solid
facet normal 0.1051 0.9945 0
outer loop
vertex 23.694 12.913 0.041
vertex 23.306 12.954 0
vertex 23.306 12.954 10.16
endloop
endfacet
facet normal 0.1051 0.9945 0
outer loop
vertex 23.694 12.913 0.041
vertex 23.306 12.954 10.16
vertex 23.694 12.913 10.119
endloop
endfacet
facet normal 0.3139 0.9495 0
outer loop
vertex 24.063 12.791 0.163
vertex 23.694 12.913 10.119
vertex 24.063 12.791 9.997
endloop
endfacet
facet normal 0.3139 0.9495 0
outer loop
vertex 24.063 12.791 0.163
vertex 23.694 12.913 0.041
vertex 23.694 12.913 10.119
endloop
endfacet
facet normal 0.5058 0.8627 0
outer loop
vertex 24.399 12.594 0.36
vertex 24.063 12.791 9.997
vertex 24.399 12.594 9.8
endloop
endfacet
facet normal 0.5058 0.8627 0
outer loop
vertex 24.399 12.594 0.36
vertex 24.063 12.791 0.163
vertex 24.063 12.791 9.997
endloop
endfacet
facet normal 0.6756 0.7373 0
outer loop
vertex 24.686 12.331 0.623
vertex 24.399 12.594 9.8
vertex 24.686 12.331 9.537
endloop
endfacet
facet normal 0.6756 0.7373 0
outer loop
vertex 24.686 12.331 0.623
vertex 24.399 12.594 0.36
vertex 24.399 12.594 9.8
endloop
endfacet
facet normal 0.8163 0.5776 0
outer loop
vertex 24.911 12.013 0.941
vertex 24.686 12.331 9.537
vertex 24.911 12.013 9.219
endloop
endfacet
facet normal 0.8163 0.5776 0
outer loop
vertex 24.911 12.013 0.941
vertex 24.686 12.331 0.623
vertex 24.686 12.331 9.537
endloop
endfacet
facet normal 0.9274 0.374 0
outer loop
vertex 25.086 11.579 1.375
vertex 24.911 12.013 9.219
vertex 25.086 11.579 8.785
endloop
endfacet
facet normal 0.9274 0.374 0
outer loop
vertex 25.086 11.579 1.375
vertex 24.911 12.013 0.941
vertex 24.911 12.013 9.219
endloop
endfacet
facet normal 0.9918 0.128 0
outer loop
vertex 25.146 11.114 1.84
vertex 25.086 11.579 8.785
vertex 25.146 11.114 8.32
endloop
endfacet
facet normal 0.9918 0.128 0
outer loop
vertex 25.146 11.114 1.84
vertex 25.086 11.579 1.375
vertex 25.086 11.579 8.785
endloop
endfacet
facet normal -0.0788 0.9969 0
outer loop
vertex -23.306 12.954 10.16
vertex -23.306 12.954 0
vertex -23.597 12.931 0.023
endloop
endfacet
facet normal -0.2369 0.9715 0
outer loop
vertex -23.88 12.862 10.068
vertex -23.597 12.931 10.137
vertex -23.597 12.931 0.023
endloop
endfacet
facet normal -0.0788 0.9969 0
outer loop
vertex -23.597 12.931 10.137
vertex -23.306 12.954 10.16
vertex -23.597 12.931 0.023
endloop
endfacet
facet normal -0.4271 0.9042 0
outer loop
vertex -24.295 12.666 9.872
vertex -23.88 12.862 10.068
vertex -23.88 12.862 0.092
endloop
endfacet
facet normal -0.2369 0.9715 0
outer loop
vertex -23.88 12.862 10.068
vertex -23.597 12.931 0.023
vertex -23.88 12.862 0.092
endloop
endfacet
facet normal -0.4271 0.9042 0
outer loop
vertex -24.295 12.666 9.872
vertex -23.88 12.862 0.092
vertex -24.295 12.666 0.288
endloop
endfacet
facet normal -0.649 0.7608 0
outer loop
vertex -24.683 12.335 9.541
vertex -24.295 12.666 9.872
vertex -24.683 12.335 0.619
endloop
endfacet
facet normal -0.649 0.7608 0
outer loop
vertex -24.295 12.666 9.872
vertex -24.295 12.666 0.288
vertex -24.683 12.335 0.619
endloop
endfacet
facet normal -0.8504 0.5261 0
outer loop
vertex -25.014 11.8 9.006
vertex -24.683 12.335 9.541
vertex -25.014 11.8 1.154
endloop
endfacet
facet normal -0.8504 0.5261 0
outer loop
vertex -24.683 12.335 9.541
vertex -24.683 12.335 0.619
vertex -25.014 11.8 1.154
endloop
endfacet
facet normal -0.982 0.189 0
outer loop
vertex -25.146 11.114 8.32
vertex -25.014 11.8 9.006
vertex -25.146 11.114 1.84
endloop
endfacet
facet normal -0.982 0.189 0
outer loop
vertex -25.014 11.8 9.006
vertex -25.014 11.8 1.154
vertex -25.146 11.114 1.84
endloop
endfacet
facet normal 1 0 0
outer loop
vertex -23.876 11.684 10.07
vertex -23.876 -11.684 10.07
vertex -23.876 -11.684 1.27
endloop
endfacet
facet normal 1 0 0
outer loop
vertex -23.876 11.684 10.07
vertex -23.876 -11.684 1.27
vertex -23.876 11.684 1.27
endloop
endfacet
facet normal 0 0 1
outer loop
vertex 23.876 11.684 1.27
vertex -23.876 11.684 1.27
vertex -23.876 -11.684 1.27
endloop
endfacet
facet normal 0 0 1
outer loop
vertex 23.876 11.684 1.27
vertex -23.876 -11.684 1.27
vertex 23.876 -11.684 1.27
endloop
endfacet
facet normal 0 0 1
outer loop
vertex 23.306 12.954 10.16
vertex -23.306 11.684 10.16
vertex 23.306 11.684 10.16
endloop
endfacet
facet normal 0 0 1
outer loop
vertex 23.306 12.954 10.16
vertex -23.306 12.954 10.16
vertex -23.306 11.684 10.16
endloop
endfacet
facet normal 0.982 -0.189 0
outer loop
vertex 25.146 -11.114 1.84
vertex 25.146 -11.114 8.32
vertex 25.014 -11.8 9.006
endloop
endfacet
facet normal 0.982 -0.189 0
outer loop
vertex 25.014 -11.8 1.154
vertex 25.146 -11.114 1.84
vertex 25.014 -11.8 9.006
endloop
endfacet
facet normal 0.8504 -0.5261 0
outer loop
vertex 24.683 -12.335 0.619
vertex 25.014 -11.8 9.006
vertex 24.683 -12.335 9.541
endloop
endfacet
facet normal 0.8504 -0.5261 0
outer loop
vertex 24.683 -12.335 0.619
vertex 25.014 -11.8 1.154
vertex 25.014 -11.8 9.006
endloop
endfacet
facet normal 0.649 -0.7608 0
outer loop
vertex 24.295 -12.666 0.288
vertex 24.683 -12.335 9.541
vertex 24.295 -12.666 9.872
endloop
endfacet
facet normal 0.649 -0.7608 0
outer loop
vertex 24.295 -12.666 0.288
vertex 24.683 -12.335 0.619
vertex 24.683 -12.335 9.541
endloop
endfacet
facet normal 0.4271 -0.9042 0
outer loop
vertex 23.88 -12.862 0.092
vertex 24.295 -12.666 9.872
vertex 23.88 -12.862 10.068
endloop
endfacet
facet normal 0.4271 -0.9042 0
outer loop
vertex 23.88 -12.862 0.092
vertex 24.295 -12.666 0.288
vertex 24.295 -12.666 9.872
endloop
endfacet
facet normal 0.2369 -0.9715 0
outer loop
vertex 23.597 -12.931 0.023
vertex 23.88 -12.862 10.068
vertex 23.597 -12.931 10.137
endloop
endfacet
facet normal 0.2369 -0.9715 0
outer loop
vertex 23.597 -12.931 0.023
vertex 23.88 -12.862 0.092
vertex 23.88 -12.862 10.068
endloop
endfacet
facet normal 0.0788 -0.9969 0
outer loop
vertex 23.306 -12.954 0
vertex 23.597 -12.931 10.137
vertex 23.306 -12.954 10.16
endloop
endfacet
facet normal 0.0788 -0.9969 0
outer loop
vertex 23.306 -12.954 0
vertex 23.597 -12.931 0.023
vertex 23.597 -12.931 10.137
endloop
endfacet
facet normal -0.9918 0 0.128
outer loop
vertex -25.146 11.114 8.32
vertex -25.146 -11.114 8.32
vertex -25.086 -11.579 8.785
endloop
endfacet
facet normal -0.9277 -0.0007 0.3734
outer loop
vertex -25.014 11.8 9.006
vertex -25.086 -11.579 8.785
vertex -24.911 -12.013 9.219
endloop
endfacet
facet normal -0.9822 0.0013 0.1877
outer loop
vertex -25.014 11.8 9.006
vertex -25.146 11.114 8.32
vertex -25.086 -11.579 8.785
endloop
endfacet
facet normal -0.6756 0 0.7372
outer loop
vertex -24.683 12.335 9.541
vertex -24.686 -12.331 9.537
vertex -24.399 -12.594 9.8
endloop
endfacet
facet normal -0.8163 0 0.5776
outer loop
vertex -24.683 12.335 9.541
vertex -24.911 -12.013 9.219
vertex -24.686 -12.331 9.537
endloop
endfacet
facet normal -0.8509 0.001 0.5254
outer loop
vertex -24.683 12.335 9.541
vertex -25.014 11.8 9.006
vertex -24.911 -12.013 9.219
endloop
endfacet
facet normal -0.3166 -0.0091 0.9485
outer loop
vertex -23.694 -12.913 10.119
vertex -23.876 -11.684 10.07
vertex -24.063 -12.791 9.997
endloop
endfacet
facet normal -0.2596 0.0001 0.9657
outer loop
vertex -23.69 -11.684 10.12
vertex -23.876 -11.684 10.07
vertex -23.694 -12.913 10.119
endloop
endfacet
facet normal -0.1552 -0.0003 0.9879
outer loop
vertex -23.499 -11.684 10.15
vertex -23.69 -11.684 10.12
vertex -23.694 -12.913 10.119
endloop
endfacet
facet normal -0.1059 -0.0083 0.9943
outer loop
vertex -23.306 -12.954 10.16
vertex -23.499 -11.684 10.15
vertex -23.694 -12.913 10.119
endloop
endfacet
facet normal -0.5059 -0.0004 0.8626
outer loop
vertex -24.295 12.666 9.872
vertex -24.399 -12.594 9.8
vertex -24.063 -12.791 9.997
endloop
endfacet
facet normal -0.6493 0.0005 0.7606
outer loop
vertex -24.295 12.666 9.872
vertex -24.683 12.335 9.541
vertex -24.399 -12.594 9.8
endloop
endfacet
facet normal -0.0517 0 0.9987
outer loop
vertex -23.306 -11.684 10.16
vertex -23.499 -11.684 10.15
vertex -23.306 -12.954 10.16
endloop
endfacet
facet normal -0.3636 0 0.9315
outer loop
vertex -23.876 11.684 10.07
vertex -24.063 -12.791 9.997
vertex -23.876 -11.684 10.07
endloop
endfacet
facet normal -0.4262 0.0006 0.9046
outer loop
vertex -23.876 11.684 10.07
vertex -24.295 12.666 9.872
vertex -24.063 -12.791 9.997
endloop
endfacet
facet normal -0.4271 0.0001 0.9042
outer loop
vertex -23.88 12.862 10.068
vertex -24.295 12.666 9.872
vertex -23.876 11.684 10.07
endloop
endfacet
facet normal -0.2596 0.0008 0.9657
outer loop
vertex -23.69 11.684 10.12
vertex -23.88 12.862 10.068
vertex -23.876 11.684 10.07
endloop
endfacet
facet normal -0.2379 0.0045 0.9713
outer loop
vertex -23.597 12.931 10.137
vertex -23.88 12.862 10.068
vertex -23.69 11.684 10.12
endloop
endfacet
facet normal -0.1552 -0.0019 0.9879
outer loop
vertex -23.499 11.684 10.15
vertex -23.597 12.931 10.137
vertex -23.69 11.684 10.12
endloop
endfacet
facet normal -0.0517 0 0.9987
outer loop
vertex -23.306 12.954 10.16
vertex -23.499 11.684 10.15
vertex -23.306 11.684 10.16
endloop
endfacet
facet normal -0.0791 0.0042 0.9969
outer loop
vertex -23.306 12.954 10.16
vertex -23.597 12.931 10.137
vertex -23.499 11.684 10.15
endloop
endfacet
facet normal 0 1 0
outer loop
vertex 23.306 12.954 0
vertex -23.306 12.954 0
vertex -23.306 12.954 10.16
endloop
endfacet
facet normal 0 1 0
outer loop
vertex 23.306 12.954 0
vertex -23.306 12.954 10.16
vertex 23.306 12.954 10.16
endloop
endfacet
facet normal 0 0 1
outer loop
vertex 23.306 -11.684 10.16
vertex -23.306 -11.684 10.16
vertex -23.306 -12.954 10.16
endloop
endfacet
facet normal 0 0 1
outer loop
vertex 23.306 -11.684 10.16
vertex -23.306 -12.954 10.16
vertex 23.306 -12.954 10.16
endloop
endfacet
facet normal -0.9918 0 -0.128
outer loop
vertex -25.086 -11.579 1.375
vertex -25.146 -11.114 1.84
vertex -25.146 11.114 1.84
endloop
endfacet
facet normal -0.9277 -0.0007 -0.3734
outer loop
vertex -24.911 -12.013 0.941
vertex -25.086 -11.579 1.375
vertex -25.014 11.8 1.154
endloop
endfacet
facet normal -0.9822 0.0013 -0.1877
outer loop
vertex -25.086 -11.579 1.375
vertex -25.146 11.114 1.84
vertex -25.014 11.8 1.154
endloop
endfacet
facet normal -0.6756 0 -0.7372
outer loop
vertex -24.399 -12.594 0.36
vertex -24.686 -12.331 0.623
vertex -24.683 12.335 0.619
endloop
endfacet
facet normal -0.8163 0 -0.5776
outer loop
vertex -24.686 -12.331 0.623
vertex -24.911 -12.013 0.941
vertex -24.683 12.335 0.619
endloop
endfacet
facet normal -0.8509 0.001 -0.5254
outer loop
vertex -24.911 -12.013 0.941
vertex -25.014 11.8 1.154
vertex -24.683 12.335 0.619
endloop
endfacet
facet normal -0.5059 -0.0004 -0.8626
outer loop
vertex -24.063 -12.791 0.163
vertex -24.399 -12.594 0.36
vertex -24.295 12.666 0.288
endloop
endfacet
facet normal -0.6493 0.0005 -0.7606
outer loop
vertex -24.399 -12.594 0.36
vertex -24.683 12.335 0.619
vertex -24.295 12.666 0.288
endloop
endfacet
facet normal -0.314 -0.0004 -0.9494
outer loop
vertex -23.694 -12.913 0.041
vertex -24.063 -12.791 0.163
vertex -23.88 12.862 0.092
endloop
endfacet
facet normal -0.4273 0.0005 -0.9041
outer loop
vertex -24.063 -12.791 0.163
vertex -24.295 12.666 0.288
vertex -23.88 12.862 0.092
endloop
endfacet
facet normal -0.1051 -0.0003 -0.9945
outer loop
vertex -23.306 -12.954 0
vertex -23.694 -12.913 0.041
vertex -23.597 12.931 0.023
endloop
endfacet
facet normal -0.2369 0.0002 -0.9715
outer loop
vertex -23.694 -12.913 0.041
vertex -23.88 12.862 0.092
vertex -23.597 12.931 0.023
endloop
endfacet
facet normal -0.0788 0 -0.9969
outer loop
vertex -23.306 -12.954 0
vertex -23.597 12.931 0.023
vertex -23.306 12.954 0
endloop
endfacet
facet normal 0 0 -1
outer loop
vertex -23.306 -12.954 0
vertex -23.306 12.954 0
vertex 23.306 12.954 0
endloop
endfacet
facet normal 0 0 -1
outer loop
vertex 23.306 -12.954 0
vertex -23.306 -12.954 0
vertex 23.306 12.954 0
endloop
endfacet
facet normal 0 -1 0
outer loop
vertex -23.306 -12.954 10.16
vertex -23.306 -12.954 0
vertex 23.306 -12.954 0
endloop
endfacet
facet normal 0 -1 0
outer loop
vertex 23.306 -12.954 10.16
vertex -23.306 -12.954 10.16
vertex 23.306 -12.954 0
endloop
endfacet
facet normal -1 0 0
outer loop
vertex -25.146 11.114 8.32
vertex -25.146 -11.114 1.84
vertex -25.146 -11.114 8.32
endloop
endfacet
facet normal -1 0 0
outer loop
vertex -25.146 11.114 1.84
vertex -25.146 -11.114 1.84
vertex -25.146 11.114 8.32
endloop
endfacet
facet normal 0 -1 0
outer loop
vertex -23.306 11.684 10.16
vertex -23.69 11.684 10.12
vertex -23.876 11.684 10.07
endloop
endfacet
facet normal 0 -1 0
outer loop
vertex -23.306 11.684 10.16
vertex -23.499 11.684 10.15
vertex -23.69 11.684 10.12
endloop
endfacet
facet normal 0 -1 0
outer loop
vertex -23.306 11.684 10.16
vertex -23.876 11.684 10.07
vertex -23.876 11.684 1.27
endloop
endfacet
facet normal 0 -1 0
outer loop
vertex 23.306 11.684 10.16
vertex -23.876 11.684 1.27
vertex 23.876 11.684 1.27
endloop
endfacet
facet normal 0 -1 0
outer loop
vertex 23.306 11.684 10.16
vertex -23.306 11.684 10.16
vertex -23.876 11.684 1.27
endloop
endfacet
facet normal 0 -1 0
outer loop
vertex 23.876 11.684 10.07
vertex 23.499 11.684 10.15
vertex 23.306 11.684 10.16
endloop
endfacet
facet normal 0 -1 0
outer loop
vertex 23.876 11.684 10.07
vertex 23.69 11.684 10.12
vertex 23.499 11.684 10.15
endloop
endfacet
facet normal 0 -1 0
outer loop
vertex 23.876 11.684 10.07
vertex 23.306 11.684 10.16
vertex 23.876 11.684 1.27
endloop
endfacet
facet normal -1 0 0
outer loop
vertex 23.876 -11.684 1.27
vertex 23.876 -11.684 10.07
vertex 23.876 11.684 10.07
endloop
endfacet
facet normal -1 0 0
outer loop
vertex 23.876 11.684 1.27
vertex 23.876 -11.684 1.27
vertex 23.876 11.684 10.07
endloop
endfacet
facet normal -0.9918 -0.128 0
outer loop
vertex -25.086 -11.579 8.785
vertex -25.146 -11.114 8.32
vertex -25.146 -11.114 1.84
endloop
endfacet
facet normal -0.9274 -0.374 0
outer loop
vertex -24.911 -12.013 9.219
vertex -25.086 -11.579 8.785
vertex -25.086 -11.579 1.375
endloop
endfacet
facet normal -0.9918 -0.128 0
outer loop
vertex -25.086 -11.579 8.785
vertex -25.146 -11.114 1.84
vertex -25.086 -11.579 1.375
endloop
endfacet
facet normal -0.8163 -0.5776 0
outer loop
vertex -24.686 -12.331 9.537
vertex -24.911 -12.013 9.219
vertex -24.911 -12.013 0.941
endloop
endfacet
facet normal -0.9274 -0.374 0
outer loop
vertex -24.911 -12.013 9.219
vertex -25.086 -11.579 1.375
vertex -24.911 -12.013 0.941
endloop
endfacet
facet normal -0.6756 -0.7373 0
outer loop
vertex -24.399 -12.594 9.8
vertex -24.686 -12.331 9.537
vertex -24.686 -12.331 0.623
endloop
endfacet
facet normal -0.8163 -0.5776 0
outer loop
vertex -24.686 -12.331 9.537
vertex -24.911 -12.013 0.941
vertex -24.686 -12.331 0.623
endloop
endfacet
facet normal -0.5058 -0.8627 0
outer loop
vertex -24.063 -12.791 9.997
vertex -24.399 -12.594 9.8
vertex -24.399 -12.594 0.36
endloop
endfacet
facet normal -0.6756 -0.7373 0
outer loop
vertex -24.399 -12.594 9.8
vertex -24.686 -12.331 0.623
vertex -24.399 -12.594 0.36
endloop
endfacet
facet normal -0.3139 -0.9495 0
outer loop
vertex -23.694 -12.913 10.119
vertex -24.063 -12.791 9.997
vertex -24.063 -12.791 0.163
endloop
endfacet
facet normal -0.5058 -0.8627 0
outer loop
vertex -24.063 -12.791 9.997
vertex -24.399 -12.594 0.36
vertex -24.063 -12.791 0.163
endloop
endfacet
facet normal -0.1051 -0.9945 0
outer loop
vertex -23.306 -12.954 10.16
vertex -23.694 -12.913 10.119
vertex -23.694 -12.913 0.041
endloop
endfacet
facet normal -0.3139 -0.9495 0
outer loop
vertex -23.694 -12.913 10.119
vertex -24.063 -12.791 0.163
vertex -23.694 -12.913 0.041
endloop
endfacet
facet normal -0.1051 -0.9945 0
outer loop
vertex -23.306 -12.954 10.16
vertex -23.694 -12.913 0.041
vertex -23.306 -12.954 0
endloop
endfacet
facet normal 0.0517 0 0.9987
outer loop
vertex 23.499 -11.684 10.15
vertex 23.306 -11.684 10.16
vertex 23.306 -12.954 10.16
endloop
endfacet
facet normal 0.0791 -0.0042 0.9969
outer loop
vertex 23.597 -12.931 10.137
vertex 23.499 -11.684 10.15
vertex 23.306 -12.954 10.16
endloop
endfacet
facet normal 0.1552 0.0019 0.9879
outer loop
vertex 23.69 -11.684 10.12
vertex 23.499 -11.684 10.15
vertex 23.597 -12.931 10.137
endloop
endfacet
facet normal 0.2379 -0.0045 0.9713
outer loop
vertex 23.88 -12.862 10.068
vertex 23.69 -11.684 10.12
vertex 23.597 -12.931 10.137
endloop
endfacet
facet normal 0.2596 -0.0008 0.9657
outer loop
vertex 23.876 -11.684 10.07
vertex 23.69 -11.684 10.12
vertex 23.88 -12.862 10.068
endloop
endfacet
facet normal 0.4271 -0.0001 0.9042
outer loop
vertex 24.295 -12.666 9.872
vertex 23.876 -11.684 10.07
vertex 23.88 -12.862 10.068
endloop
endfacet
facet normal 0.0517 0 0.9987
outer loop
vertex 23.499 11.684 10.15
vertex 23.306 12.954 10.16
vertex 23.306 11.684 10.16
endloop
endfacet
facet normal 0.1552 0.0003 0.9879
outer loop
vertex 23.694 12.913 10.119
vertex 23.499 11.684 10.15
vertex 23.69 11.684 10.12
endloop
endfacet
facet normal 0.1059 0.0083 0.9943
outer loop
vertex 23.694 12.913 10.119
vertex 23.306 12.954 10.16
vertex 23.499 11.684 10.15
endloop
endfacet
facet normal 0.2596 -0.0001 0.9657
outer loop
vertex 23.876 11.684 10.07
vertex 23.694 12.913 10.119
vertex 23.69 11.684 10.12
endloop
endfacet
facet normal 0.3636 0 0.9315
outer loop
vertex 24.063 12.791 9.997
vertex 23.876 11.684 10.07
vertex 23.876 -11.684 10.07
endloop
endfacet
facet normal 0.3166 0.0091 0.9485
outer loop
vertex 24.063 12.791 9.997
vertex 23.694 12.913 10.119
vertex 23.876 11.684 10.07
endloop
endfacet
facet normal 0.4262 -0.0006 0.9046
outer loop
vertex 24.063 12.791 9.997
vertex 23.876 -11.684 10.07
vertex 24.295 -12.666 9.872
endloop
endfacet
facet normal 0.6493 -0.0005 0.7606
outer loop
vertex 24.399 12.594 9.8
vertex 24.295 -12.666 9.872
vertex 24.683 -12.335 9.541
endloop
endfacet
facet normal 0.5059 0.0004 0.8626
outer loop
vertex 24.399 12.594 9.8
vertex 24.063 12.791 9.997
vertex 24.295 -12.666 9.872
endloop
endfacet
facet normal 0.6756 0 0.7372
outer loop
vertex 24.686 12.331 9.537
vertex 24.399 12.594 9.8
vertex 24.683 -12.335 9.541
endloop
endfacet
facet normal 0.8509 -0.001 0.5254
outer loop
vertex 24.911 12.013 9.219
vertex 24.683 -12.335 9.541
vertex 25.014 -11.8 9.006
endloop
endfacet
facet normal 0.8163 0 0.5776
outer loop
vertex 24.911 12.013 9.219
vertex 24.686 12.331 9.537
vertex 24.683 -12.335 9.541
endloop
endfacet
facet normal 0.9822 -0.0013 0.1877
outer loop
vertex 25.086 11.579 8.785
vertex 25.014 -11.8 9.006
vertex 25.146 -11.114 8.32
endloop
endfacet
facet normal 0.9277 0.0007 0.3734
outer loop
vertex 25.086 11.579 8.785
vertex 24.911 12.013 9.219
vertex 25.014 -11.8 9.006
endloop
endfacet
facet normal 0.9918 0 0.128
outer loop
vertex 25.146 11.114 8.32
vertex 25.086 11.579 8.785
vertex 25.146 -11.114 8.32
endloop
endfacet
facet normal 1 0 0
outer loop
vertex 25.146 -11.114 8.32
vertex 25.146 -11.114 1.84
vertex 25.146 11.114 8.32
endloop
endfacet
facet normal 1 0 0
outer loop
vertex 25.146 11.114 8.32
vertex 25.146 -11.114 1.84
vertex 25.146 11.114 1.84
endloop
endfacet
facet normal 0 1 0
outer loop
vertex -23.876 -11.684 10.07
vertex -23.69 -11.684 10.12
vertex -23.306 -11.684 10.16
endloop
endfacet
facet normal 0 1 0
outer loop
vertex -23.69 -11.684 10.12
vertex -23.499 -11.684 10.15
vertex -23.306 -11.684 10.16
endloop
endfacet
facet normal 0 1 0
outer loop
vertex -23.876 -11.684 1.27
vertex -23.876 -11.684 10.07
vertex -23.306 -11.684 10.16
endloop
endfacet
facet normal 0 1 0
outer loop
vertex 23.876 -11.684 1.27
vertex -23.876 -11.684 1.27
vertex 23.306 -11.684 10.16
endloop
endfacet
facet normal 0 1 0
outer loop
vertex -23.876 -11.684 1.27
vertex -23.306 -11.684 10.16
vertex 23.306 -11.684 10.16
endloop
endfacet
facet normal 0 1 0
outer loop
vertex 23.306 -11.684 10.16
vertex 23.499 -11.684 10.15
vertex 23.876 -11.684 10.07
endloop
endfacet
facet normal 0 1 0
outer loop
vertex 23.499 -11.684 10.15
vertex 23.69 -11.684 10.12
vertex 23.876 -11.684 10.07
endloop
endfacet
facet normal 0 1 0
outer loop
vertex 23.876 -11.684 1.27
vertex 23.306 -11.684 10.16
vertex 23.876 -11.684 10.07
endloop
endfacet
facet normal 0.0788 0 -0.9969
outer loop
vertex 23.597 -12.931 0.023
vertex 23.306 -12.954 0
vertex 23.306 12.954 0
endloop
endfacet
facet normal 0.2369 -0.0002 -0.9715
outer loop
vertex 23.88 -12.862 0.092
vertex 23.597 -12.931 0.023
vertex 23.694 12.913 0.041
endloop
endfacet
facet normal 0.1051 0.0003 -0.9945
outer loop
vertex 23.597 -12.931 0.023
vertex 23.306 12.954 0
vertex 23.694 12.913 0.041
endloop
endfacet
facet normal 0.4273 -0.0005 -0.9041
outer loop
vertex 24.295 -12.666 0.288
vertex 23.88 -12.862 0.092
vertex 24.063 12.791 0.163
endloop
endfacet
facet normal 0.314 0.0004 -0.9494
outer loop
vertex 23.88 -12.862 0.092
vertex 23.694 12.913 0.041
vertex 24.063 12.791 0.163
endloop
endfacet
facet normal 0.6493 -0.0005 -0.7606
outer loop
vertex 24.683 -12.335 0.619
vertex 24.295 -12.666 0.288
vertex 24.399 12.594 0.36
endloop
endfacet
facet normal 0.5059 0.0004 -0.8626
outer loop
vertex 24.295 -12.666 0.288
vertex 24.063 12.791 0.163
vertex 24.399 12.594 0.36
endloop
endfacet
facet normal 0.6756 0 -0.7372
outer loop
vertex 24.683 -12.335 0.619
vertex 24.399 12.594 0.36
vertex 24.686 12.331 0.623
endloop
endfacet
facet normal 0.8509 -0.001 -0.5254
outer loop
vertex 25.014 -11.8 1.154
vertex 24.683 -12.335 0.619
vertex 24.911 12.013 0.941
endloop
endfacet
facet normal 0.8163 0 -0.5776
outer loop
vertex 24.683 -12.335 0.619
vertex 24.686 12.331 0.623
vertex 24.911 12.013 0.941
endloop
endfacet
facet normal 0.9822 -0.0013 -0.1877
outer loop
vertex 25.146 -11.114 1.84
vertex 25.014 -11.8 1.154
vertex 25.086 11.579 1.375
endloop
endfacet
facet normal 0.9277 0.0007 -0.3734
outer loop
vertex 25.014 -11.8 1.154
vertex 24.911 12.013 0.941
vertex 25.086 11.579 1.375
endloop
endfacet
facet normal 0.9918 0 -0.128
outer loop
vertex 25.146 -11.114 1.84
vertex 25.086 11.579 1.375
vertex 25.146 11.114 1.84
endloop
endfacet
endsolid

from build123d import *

# Parameters (mm, degrees)
F0_W        = 50.292
F0_H        = 25.908
F1_DEPTH    = 10.16
F2_W        = 47.752
F2_H        = 23.368
F3_DEPTH    = 8.89
F4_T1_DEPTH = 19.3581536726
F4_T3_DEPTH = 35.1061536726
F5_T1_DEPTH = 19.3581536726
F5_T3_DEPTH = 35.1061536726


# Not quite as in the source:
# - a fillet or chamfer that OpenCascade refuses, or shapes differently, is made with other operations: its cross-section is extruded or revolved along the edge and cut away or added
# - a feature names something its author has since deleted; it is built from what else it names


with BuildPart() as f1:
    # F0 (on Top) → F1 (new body)
    with BuildSketch(Plane.XY):
        Rectangle(F0_W, F0_H)
    extrude(amount=F1_DEPTH)

    # F2 (on face) → F3 (cut)
    with BuildSketch(Plane.XY.offset(10.16)):
        Rectangle(F2_W, F2_H)
    extrude(amount=-F3_DEPTH, mode=Mode.SUBTRACT)

    # F4: fillet of radius 1.8396307345 on 4 edges, made by hand

    # F4_s2 → F4_t1 (cut)
    with BuildSketch(Plane.XY.offset(-4.5990768363)):
        with BuildLine():
            ThreePointArc((-23.3063692655, 12.954), (-24.6071846327, 12.4151846327), (-25.146, 11.1143692655))
            Line((-25.146, 11.1143692655), (-25.146, 12.954))
            Line((-25.146, 12.954), (-23.3063692655, 12.954))
        make_face()
        with BuildLine():
            ThreePointArc((-25.146, -11.1143692655), (-24.6071846327, -12.4151846327), (-23.3063692655, -12.954))
            Line((-23.3063692655, -12.954), (-25.146, -12.954))
            Line((-25.146, -12.954), (-25.146, -11.1143692655))
        make_face()
    extrude(amount=F4_T1_DEPTH, mode=Mode.SUBTRACT)

    # F4_s4 → F4_t3 (cut)
    with BuildSketch(Plane.XZ.offset(-17.5530768363)):
        with BuildLine():
            ThreePointArc((-25.146, 1.8396307345), (-24.6071846327, 0.5388153673), (-23.3063692655, 0))
            Line((-23.3063692655, 0), (-25.146, 0))
            Line((-25.146, 0), (-25.146, 1.8396307345))
        make_face()
        with BuildLine():
            ThreePointArc((-25.146, 8.3203692655), (-24.6071846327, 9.6211846327), (-23.3063692655, 10.16))
            Line((-23.3063692655, 10.16), (-25.146, 10.16))
            Line((-25.146, 10.16), (-25.146, 8.3203692655))
        make_face()
    extrude(amount=F4_T3_DEPTH, mode=Mode.SUBTRACT)

    # F5: fillet of radius 1.8396307345 on 4 edges, made by hand

    # F5_s2 → F5_t1 (cut)
    with BuildSketch(Plane.XY.offset(-4.5990768363)):
        with BuildLine():
            ThreePointArc((25.146, -11.1143692655), (24.6071846327, -12.4151846327), (23.3063692655, -12.954))
            Line((23.3063692655, -12.954), (25.146, -12.954))
            Line((25.146, -12.954), (25.146, -11.1143692655))
        make_face()
        with BuildLine():
            ThreePointArc((23.3063692655, 12.954), (24.6071846327, 12.4151846327), (25.146, 11.1143692655))
            Line((25.146, 11.1143692655), (25.146, 12.954))
            Line((25.146, 12.954), (23.3063692655, 12.954))
        make_face()
    extrude(amount=F5_T1_DEPTH, mode=Mode.SUBTRACT)

    # F5_s4 → F5_t3 (cut)
    with BuildSketch(Plane.XZ.offset(-17.5530768363)):
        with BuildLine():
            ThreePointArc((23.3063692655, 0), (24.6071846327, 0.5388153673), (25.146, 1.8396307345))
            Line((25.146, 1.8396307345), (25.146, 0))
            Line((25.146, 0), (23.3063692655, 0))
        make_face()
        with BuildLine():
            ThreePointArc((23.3063692655, 10.16), (24.6071846327, 9.6211846327), (25.146, 8.3203692655))
            Line((25.146, 8.3203692655), (25.146, 10.16))
            Line((25.146, 10.16), (23.3063692655, 10.16))
        make_face()
    extrude(amount=F5_T3_DEPTH, mode=Mode.SUBTRACT)


solid = f1.part
